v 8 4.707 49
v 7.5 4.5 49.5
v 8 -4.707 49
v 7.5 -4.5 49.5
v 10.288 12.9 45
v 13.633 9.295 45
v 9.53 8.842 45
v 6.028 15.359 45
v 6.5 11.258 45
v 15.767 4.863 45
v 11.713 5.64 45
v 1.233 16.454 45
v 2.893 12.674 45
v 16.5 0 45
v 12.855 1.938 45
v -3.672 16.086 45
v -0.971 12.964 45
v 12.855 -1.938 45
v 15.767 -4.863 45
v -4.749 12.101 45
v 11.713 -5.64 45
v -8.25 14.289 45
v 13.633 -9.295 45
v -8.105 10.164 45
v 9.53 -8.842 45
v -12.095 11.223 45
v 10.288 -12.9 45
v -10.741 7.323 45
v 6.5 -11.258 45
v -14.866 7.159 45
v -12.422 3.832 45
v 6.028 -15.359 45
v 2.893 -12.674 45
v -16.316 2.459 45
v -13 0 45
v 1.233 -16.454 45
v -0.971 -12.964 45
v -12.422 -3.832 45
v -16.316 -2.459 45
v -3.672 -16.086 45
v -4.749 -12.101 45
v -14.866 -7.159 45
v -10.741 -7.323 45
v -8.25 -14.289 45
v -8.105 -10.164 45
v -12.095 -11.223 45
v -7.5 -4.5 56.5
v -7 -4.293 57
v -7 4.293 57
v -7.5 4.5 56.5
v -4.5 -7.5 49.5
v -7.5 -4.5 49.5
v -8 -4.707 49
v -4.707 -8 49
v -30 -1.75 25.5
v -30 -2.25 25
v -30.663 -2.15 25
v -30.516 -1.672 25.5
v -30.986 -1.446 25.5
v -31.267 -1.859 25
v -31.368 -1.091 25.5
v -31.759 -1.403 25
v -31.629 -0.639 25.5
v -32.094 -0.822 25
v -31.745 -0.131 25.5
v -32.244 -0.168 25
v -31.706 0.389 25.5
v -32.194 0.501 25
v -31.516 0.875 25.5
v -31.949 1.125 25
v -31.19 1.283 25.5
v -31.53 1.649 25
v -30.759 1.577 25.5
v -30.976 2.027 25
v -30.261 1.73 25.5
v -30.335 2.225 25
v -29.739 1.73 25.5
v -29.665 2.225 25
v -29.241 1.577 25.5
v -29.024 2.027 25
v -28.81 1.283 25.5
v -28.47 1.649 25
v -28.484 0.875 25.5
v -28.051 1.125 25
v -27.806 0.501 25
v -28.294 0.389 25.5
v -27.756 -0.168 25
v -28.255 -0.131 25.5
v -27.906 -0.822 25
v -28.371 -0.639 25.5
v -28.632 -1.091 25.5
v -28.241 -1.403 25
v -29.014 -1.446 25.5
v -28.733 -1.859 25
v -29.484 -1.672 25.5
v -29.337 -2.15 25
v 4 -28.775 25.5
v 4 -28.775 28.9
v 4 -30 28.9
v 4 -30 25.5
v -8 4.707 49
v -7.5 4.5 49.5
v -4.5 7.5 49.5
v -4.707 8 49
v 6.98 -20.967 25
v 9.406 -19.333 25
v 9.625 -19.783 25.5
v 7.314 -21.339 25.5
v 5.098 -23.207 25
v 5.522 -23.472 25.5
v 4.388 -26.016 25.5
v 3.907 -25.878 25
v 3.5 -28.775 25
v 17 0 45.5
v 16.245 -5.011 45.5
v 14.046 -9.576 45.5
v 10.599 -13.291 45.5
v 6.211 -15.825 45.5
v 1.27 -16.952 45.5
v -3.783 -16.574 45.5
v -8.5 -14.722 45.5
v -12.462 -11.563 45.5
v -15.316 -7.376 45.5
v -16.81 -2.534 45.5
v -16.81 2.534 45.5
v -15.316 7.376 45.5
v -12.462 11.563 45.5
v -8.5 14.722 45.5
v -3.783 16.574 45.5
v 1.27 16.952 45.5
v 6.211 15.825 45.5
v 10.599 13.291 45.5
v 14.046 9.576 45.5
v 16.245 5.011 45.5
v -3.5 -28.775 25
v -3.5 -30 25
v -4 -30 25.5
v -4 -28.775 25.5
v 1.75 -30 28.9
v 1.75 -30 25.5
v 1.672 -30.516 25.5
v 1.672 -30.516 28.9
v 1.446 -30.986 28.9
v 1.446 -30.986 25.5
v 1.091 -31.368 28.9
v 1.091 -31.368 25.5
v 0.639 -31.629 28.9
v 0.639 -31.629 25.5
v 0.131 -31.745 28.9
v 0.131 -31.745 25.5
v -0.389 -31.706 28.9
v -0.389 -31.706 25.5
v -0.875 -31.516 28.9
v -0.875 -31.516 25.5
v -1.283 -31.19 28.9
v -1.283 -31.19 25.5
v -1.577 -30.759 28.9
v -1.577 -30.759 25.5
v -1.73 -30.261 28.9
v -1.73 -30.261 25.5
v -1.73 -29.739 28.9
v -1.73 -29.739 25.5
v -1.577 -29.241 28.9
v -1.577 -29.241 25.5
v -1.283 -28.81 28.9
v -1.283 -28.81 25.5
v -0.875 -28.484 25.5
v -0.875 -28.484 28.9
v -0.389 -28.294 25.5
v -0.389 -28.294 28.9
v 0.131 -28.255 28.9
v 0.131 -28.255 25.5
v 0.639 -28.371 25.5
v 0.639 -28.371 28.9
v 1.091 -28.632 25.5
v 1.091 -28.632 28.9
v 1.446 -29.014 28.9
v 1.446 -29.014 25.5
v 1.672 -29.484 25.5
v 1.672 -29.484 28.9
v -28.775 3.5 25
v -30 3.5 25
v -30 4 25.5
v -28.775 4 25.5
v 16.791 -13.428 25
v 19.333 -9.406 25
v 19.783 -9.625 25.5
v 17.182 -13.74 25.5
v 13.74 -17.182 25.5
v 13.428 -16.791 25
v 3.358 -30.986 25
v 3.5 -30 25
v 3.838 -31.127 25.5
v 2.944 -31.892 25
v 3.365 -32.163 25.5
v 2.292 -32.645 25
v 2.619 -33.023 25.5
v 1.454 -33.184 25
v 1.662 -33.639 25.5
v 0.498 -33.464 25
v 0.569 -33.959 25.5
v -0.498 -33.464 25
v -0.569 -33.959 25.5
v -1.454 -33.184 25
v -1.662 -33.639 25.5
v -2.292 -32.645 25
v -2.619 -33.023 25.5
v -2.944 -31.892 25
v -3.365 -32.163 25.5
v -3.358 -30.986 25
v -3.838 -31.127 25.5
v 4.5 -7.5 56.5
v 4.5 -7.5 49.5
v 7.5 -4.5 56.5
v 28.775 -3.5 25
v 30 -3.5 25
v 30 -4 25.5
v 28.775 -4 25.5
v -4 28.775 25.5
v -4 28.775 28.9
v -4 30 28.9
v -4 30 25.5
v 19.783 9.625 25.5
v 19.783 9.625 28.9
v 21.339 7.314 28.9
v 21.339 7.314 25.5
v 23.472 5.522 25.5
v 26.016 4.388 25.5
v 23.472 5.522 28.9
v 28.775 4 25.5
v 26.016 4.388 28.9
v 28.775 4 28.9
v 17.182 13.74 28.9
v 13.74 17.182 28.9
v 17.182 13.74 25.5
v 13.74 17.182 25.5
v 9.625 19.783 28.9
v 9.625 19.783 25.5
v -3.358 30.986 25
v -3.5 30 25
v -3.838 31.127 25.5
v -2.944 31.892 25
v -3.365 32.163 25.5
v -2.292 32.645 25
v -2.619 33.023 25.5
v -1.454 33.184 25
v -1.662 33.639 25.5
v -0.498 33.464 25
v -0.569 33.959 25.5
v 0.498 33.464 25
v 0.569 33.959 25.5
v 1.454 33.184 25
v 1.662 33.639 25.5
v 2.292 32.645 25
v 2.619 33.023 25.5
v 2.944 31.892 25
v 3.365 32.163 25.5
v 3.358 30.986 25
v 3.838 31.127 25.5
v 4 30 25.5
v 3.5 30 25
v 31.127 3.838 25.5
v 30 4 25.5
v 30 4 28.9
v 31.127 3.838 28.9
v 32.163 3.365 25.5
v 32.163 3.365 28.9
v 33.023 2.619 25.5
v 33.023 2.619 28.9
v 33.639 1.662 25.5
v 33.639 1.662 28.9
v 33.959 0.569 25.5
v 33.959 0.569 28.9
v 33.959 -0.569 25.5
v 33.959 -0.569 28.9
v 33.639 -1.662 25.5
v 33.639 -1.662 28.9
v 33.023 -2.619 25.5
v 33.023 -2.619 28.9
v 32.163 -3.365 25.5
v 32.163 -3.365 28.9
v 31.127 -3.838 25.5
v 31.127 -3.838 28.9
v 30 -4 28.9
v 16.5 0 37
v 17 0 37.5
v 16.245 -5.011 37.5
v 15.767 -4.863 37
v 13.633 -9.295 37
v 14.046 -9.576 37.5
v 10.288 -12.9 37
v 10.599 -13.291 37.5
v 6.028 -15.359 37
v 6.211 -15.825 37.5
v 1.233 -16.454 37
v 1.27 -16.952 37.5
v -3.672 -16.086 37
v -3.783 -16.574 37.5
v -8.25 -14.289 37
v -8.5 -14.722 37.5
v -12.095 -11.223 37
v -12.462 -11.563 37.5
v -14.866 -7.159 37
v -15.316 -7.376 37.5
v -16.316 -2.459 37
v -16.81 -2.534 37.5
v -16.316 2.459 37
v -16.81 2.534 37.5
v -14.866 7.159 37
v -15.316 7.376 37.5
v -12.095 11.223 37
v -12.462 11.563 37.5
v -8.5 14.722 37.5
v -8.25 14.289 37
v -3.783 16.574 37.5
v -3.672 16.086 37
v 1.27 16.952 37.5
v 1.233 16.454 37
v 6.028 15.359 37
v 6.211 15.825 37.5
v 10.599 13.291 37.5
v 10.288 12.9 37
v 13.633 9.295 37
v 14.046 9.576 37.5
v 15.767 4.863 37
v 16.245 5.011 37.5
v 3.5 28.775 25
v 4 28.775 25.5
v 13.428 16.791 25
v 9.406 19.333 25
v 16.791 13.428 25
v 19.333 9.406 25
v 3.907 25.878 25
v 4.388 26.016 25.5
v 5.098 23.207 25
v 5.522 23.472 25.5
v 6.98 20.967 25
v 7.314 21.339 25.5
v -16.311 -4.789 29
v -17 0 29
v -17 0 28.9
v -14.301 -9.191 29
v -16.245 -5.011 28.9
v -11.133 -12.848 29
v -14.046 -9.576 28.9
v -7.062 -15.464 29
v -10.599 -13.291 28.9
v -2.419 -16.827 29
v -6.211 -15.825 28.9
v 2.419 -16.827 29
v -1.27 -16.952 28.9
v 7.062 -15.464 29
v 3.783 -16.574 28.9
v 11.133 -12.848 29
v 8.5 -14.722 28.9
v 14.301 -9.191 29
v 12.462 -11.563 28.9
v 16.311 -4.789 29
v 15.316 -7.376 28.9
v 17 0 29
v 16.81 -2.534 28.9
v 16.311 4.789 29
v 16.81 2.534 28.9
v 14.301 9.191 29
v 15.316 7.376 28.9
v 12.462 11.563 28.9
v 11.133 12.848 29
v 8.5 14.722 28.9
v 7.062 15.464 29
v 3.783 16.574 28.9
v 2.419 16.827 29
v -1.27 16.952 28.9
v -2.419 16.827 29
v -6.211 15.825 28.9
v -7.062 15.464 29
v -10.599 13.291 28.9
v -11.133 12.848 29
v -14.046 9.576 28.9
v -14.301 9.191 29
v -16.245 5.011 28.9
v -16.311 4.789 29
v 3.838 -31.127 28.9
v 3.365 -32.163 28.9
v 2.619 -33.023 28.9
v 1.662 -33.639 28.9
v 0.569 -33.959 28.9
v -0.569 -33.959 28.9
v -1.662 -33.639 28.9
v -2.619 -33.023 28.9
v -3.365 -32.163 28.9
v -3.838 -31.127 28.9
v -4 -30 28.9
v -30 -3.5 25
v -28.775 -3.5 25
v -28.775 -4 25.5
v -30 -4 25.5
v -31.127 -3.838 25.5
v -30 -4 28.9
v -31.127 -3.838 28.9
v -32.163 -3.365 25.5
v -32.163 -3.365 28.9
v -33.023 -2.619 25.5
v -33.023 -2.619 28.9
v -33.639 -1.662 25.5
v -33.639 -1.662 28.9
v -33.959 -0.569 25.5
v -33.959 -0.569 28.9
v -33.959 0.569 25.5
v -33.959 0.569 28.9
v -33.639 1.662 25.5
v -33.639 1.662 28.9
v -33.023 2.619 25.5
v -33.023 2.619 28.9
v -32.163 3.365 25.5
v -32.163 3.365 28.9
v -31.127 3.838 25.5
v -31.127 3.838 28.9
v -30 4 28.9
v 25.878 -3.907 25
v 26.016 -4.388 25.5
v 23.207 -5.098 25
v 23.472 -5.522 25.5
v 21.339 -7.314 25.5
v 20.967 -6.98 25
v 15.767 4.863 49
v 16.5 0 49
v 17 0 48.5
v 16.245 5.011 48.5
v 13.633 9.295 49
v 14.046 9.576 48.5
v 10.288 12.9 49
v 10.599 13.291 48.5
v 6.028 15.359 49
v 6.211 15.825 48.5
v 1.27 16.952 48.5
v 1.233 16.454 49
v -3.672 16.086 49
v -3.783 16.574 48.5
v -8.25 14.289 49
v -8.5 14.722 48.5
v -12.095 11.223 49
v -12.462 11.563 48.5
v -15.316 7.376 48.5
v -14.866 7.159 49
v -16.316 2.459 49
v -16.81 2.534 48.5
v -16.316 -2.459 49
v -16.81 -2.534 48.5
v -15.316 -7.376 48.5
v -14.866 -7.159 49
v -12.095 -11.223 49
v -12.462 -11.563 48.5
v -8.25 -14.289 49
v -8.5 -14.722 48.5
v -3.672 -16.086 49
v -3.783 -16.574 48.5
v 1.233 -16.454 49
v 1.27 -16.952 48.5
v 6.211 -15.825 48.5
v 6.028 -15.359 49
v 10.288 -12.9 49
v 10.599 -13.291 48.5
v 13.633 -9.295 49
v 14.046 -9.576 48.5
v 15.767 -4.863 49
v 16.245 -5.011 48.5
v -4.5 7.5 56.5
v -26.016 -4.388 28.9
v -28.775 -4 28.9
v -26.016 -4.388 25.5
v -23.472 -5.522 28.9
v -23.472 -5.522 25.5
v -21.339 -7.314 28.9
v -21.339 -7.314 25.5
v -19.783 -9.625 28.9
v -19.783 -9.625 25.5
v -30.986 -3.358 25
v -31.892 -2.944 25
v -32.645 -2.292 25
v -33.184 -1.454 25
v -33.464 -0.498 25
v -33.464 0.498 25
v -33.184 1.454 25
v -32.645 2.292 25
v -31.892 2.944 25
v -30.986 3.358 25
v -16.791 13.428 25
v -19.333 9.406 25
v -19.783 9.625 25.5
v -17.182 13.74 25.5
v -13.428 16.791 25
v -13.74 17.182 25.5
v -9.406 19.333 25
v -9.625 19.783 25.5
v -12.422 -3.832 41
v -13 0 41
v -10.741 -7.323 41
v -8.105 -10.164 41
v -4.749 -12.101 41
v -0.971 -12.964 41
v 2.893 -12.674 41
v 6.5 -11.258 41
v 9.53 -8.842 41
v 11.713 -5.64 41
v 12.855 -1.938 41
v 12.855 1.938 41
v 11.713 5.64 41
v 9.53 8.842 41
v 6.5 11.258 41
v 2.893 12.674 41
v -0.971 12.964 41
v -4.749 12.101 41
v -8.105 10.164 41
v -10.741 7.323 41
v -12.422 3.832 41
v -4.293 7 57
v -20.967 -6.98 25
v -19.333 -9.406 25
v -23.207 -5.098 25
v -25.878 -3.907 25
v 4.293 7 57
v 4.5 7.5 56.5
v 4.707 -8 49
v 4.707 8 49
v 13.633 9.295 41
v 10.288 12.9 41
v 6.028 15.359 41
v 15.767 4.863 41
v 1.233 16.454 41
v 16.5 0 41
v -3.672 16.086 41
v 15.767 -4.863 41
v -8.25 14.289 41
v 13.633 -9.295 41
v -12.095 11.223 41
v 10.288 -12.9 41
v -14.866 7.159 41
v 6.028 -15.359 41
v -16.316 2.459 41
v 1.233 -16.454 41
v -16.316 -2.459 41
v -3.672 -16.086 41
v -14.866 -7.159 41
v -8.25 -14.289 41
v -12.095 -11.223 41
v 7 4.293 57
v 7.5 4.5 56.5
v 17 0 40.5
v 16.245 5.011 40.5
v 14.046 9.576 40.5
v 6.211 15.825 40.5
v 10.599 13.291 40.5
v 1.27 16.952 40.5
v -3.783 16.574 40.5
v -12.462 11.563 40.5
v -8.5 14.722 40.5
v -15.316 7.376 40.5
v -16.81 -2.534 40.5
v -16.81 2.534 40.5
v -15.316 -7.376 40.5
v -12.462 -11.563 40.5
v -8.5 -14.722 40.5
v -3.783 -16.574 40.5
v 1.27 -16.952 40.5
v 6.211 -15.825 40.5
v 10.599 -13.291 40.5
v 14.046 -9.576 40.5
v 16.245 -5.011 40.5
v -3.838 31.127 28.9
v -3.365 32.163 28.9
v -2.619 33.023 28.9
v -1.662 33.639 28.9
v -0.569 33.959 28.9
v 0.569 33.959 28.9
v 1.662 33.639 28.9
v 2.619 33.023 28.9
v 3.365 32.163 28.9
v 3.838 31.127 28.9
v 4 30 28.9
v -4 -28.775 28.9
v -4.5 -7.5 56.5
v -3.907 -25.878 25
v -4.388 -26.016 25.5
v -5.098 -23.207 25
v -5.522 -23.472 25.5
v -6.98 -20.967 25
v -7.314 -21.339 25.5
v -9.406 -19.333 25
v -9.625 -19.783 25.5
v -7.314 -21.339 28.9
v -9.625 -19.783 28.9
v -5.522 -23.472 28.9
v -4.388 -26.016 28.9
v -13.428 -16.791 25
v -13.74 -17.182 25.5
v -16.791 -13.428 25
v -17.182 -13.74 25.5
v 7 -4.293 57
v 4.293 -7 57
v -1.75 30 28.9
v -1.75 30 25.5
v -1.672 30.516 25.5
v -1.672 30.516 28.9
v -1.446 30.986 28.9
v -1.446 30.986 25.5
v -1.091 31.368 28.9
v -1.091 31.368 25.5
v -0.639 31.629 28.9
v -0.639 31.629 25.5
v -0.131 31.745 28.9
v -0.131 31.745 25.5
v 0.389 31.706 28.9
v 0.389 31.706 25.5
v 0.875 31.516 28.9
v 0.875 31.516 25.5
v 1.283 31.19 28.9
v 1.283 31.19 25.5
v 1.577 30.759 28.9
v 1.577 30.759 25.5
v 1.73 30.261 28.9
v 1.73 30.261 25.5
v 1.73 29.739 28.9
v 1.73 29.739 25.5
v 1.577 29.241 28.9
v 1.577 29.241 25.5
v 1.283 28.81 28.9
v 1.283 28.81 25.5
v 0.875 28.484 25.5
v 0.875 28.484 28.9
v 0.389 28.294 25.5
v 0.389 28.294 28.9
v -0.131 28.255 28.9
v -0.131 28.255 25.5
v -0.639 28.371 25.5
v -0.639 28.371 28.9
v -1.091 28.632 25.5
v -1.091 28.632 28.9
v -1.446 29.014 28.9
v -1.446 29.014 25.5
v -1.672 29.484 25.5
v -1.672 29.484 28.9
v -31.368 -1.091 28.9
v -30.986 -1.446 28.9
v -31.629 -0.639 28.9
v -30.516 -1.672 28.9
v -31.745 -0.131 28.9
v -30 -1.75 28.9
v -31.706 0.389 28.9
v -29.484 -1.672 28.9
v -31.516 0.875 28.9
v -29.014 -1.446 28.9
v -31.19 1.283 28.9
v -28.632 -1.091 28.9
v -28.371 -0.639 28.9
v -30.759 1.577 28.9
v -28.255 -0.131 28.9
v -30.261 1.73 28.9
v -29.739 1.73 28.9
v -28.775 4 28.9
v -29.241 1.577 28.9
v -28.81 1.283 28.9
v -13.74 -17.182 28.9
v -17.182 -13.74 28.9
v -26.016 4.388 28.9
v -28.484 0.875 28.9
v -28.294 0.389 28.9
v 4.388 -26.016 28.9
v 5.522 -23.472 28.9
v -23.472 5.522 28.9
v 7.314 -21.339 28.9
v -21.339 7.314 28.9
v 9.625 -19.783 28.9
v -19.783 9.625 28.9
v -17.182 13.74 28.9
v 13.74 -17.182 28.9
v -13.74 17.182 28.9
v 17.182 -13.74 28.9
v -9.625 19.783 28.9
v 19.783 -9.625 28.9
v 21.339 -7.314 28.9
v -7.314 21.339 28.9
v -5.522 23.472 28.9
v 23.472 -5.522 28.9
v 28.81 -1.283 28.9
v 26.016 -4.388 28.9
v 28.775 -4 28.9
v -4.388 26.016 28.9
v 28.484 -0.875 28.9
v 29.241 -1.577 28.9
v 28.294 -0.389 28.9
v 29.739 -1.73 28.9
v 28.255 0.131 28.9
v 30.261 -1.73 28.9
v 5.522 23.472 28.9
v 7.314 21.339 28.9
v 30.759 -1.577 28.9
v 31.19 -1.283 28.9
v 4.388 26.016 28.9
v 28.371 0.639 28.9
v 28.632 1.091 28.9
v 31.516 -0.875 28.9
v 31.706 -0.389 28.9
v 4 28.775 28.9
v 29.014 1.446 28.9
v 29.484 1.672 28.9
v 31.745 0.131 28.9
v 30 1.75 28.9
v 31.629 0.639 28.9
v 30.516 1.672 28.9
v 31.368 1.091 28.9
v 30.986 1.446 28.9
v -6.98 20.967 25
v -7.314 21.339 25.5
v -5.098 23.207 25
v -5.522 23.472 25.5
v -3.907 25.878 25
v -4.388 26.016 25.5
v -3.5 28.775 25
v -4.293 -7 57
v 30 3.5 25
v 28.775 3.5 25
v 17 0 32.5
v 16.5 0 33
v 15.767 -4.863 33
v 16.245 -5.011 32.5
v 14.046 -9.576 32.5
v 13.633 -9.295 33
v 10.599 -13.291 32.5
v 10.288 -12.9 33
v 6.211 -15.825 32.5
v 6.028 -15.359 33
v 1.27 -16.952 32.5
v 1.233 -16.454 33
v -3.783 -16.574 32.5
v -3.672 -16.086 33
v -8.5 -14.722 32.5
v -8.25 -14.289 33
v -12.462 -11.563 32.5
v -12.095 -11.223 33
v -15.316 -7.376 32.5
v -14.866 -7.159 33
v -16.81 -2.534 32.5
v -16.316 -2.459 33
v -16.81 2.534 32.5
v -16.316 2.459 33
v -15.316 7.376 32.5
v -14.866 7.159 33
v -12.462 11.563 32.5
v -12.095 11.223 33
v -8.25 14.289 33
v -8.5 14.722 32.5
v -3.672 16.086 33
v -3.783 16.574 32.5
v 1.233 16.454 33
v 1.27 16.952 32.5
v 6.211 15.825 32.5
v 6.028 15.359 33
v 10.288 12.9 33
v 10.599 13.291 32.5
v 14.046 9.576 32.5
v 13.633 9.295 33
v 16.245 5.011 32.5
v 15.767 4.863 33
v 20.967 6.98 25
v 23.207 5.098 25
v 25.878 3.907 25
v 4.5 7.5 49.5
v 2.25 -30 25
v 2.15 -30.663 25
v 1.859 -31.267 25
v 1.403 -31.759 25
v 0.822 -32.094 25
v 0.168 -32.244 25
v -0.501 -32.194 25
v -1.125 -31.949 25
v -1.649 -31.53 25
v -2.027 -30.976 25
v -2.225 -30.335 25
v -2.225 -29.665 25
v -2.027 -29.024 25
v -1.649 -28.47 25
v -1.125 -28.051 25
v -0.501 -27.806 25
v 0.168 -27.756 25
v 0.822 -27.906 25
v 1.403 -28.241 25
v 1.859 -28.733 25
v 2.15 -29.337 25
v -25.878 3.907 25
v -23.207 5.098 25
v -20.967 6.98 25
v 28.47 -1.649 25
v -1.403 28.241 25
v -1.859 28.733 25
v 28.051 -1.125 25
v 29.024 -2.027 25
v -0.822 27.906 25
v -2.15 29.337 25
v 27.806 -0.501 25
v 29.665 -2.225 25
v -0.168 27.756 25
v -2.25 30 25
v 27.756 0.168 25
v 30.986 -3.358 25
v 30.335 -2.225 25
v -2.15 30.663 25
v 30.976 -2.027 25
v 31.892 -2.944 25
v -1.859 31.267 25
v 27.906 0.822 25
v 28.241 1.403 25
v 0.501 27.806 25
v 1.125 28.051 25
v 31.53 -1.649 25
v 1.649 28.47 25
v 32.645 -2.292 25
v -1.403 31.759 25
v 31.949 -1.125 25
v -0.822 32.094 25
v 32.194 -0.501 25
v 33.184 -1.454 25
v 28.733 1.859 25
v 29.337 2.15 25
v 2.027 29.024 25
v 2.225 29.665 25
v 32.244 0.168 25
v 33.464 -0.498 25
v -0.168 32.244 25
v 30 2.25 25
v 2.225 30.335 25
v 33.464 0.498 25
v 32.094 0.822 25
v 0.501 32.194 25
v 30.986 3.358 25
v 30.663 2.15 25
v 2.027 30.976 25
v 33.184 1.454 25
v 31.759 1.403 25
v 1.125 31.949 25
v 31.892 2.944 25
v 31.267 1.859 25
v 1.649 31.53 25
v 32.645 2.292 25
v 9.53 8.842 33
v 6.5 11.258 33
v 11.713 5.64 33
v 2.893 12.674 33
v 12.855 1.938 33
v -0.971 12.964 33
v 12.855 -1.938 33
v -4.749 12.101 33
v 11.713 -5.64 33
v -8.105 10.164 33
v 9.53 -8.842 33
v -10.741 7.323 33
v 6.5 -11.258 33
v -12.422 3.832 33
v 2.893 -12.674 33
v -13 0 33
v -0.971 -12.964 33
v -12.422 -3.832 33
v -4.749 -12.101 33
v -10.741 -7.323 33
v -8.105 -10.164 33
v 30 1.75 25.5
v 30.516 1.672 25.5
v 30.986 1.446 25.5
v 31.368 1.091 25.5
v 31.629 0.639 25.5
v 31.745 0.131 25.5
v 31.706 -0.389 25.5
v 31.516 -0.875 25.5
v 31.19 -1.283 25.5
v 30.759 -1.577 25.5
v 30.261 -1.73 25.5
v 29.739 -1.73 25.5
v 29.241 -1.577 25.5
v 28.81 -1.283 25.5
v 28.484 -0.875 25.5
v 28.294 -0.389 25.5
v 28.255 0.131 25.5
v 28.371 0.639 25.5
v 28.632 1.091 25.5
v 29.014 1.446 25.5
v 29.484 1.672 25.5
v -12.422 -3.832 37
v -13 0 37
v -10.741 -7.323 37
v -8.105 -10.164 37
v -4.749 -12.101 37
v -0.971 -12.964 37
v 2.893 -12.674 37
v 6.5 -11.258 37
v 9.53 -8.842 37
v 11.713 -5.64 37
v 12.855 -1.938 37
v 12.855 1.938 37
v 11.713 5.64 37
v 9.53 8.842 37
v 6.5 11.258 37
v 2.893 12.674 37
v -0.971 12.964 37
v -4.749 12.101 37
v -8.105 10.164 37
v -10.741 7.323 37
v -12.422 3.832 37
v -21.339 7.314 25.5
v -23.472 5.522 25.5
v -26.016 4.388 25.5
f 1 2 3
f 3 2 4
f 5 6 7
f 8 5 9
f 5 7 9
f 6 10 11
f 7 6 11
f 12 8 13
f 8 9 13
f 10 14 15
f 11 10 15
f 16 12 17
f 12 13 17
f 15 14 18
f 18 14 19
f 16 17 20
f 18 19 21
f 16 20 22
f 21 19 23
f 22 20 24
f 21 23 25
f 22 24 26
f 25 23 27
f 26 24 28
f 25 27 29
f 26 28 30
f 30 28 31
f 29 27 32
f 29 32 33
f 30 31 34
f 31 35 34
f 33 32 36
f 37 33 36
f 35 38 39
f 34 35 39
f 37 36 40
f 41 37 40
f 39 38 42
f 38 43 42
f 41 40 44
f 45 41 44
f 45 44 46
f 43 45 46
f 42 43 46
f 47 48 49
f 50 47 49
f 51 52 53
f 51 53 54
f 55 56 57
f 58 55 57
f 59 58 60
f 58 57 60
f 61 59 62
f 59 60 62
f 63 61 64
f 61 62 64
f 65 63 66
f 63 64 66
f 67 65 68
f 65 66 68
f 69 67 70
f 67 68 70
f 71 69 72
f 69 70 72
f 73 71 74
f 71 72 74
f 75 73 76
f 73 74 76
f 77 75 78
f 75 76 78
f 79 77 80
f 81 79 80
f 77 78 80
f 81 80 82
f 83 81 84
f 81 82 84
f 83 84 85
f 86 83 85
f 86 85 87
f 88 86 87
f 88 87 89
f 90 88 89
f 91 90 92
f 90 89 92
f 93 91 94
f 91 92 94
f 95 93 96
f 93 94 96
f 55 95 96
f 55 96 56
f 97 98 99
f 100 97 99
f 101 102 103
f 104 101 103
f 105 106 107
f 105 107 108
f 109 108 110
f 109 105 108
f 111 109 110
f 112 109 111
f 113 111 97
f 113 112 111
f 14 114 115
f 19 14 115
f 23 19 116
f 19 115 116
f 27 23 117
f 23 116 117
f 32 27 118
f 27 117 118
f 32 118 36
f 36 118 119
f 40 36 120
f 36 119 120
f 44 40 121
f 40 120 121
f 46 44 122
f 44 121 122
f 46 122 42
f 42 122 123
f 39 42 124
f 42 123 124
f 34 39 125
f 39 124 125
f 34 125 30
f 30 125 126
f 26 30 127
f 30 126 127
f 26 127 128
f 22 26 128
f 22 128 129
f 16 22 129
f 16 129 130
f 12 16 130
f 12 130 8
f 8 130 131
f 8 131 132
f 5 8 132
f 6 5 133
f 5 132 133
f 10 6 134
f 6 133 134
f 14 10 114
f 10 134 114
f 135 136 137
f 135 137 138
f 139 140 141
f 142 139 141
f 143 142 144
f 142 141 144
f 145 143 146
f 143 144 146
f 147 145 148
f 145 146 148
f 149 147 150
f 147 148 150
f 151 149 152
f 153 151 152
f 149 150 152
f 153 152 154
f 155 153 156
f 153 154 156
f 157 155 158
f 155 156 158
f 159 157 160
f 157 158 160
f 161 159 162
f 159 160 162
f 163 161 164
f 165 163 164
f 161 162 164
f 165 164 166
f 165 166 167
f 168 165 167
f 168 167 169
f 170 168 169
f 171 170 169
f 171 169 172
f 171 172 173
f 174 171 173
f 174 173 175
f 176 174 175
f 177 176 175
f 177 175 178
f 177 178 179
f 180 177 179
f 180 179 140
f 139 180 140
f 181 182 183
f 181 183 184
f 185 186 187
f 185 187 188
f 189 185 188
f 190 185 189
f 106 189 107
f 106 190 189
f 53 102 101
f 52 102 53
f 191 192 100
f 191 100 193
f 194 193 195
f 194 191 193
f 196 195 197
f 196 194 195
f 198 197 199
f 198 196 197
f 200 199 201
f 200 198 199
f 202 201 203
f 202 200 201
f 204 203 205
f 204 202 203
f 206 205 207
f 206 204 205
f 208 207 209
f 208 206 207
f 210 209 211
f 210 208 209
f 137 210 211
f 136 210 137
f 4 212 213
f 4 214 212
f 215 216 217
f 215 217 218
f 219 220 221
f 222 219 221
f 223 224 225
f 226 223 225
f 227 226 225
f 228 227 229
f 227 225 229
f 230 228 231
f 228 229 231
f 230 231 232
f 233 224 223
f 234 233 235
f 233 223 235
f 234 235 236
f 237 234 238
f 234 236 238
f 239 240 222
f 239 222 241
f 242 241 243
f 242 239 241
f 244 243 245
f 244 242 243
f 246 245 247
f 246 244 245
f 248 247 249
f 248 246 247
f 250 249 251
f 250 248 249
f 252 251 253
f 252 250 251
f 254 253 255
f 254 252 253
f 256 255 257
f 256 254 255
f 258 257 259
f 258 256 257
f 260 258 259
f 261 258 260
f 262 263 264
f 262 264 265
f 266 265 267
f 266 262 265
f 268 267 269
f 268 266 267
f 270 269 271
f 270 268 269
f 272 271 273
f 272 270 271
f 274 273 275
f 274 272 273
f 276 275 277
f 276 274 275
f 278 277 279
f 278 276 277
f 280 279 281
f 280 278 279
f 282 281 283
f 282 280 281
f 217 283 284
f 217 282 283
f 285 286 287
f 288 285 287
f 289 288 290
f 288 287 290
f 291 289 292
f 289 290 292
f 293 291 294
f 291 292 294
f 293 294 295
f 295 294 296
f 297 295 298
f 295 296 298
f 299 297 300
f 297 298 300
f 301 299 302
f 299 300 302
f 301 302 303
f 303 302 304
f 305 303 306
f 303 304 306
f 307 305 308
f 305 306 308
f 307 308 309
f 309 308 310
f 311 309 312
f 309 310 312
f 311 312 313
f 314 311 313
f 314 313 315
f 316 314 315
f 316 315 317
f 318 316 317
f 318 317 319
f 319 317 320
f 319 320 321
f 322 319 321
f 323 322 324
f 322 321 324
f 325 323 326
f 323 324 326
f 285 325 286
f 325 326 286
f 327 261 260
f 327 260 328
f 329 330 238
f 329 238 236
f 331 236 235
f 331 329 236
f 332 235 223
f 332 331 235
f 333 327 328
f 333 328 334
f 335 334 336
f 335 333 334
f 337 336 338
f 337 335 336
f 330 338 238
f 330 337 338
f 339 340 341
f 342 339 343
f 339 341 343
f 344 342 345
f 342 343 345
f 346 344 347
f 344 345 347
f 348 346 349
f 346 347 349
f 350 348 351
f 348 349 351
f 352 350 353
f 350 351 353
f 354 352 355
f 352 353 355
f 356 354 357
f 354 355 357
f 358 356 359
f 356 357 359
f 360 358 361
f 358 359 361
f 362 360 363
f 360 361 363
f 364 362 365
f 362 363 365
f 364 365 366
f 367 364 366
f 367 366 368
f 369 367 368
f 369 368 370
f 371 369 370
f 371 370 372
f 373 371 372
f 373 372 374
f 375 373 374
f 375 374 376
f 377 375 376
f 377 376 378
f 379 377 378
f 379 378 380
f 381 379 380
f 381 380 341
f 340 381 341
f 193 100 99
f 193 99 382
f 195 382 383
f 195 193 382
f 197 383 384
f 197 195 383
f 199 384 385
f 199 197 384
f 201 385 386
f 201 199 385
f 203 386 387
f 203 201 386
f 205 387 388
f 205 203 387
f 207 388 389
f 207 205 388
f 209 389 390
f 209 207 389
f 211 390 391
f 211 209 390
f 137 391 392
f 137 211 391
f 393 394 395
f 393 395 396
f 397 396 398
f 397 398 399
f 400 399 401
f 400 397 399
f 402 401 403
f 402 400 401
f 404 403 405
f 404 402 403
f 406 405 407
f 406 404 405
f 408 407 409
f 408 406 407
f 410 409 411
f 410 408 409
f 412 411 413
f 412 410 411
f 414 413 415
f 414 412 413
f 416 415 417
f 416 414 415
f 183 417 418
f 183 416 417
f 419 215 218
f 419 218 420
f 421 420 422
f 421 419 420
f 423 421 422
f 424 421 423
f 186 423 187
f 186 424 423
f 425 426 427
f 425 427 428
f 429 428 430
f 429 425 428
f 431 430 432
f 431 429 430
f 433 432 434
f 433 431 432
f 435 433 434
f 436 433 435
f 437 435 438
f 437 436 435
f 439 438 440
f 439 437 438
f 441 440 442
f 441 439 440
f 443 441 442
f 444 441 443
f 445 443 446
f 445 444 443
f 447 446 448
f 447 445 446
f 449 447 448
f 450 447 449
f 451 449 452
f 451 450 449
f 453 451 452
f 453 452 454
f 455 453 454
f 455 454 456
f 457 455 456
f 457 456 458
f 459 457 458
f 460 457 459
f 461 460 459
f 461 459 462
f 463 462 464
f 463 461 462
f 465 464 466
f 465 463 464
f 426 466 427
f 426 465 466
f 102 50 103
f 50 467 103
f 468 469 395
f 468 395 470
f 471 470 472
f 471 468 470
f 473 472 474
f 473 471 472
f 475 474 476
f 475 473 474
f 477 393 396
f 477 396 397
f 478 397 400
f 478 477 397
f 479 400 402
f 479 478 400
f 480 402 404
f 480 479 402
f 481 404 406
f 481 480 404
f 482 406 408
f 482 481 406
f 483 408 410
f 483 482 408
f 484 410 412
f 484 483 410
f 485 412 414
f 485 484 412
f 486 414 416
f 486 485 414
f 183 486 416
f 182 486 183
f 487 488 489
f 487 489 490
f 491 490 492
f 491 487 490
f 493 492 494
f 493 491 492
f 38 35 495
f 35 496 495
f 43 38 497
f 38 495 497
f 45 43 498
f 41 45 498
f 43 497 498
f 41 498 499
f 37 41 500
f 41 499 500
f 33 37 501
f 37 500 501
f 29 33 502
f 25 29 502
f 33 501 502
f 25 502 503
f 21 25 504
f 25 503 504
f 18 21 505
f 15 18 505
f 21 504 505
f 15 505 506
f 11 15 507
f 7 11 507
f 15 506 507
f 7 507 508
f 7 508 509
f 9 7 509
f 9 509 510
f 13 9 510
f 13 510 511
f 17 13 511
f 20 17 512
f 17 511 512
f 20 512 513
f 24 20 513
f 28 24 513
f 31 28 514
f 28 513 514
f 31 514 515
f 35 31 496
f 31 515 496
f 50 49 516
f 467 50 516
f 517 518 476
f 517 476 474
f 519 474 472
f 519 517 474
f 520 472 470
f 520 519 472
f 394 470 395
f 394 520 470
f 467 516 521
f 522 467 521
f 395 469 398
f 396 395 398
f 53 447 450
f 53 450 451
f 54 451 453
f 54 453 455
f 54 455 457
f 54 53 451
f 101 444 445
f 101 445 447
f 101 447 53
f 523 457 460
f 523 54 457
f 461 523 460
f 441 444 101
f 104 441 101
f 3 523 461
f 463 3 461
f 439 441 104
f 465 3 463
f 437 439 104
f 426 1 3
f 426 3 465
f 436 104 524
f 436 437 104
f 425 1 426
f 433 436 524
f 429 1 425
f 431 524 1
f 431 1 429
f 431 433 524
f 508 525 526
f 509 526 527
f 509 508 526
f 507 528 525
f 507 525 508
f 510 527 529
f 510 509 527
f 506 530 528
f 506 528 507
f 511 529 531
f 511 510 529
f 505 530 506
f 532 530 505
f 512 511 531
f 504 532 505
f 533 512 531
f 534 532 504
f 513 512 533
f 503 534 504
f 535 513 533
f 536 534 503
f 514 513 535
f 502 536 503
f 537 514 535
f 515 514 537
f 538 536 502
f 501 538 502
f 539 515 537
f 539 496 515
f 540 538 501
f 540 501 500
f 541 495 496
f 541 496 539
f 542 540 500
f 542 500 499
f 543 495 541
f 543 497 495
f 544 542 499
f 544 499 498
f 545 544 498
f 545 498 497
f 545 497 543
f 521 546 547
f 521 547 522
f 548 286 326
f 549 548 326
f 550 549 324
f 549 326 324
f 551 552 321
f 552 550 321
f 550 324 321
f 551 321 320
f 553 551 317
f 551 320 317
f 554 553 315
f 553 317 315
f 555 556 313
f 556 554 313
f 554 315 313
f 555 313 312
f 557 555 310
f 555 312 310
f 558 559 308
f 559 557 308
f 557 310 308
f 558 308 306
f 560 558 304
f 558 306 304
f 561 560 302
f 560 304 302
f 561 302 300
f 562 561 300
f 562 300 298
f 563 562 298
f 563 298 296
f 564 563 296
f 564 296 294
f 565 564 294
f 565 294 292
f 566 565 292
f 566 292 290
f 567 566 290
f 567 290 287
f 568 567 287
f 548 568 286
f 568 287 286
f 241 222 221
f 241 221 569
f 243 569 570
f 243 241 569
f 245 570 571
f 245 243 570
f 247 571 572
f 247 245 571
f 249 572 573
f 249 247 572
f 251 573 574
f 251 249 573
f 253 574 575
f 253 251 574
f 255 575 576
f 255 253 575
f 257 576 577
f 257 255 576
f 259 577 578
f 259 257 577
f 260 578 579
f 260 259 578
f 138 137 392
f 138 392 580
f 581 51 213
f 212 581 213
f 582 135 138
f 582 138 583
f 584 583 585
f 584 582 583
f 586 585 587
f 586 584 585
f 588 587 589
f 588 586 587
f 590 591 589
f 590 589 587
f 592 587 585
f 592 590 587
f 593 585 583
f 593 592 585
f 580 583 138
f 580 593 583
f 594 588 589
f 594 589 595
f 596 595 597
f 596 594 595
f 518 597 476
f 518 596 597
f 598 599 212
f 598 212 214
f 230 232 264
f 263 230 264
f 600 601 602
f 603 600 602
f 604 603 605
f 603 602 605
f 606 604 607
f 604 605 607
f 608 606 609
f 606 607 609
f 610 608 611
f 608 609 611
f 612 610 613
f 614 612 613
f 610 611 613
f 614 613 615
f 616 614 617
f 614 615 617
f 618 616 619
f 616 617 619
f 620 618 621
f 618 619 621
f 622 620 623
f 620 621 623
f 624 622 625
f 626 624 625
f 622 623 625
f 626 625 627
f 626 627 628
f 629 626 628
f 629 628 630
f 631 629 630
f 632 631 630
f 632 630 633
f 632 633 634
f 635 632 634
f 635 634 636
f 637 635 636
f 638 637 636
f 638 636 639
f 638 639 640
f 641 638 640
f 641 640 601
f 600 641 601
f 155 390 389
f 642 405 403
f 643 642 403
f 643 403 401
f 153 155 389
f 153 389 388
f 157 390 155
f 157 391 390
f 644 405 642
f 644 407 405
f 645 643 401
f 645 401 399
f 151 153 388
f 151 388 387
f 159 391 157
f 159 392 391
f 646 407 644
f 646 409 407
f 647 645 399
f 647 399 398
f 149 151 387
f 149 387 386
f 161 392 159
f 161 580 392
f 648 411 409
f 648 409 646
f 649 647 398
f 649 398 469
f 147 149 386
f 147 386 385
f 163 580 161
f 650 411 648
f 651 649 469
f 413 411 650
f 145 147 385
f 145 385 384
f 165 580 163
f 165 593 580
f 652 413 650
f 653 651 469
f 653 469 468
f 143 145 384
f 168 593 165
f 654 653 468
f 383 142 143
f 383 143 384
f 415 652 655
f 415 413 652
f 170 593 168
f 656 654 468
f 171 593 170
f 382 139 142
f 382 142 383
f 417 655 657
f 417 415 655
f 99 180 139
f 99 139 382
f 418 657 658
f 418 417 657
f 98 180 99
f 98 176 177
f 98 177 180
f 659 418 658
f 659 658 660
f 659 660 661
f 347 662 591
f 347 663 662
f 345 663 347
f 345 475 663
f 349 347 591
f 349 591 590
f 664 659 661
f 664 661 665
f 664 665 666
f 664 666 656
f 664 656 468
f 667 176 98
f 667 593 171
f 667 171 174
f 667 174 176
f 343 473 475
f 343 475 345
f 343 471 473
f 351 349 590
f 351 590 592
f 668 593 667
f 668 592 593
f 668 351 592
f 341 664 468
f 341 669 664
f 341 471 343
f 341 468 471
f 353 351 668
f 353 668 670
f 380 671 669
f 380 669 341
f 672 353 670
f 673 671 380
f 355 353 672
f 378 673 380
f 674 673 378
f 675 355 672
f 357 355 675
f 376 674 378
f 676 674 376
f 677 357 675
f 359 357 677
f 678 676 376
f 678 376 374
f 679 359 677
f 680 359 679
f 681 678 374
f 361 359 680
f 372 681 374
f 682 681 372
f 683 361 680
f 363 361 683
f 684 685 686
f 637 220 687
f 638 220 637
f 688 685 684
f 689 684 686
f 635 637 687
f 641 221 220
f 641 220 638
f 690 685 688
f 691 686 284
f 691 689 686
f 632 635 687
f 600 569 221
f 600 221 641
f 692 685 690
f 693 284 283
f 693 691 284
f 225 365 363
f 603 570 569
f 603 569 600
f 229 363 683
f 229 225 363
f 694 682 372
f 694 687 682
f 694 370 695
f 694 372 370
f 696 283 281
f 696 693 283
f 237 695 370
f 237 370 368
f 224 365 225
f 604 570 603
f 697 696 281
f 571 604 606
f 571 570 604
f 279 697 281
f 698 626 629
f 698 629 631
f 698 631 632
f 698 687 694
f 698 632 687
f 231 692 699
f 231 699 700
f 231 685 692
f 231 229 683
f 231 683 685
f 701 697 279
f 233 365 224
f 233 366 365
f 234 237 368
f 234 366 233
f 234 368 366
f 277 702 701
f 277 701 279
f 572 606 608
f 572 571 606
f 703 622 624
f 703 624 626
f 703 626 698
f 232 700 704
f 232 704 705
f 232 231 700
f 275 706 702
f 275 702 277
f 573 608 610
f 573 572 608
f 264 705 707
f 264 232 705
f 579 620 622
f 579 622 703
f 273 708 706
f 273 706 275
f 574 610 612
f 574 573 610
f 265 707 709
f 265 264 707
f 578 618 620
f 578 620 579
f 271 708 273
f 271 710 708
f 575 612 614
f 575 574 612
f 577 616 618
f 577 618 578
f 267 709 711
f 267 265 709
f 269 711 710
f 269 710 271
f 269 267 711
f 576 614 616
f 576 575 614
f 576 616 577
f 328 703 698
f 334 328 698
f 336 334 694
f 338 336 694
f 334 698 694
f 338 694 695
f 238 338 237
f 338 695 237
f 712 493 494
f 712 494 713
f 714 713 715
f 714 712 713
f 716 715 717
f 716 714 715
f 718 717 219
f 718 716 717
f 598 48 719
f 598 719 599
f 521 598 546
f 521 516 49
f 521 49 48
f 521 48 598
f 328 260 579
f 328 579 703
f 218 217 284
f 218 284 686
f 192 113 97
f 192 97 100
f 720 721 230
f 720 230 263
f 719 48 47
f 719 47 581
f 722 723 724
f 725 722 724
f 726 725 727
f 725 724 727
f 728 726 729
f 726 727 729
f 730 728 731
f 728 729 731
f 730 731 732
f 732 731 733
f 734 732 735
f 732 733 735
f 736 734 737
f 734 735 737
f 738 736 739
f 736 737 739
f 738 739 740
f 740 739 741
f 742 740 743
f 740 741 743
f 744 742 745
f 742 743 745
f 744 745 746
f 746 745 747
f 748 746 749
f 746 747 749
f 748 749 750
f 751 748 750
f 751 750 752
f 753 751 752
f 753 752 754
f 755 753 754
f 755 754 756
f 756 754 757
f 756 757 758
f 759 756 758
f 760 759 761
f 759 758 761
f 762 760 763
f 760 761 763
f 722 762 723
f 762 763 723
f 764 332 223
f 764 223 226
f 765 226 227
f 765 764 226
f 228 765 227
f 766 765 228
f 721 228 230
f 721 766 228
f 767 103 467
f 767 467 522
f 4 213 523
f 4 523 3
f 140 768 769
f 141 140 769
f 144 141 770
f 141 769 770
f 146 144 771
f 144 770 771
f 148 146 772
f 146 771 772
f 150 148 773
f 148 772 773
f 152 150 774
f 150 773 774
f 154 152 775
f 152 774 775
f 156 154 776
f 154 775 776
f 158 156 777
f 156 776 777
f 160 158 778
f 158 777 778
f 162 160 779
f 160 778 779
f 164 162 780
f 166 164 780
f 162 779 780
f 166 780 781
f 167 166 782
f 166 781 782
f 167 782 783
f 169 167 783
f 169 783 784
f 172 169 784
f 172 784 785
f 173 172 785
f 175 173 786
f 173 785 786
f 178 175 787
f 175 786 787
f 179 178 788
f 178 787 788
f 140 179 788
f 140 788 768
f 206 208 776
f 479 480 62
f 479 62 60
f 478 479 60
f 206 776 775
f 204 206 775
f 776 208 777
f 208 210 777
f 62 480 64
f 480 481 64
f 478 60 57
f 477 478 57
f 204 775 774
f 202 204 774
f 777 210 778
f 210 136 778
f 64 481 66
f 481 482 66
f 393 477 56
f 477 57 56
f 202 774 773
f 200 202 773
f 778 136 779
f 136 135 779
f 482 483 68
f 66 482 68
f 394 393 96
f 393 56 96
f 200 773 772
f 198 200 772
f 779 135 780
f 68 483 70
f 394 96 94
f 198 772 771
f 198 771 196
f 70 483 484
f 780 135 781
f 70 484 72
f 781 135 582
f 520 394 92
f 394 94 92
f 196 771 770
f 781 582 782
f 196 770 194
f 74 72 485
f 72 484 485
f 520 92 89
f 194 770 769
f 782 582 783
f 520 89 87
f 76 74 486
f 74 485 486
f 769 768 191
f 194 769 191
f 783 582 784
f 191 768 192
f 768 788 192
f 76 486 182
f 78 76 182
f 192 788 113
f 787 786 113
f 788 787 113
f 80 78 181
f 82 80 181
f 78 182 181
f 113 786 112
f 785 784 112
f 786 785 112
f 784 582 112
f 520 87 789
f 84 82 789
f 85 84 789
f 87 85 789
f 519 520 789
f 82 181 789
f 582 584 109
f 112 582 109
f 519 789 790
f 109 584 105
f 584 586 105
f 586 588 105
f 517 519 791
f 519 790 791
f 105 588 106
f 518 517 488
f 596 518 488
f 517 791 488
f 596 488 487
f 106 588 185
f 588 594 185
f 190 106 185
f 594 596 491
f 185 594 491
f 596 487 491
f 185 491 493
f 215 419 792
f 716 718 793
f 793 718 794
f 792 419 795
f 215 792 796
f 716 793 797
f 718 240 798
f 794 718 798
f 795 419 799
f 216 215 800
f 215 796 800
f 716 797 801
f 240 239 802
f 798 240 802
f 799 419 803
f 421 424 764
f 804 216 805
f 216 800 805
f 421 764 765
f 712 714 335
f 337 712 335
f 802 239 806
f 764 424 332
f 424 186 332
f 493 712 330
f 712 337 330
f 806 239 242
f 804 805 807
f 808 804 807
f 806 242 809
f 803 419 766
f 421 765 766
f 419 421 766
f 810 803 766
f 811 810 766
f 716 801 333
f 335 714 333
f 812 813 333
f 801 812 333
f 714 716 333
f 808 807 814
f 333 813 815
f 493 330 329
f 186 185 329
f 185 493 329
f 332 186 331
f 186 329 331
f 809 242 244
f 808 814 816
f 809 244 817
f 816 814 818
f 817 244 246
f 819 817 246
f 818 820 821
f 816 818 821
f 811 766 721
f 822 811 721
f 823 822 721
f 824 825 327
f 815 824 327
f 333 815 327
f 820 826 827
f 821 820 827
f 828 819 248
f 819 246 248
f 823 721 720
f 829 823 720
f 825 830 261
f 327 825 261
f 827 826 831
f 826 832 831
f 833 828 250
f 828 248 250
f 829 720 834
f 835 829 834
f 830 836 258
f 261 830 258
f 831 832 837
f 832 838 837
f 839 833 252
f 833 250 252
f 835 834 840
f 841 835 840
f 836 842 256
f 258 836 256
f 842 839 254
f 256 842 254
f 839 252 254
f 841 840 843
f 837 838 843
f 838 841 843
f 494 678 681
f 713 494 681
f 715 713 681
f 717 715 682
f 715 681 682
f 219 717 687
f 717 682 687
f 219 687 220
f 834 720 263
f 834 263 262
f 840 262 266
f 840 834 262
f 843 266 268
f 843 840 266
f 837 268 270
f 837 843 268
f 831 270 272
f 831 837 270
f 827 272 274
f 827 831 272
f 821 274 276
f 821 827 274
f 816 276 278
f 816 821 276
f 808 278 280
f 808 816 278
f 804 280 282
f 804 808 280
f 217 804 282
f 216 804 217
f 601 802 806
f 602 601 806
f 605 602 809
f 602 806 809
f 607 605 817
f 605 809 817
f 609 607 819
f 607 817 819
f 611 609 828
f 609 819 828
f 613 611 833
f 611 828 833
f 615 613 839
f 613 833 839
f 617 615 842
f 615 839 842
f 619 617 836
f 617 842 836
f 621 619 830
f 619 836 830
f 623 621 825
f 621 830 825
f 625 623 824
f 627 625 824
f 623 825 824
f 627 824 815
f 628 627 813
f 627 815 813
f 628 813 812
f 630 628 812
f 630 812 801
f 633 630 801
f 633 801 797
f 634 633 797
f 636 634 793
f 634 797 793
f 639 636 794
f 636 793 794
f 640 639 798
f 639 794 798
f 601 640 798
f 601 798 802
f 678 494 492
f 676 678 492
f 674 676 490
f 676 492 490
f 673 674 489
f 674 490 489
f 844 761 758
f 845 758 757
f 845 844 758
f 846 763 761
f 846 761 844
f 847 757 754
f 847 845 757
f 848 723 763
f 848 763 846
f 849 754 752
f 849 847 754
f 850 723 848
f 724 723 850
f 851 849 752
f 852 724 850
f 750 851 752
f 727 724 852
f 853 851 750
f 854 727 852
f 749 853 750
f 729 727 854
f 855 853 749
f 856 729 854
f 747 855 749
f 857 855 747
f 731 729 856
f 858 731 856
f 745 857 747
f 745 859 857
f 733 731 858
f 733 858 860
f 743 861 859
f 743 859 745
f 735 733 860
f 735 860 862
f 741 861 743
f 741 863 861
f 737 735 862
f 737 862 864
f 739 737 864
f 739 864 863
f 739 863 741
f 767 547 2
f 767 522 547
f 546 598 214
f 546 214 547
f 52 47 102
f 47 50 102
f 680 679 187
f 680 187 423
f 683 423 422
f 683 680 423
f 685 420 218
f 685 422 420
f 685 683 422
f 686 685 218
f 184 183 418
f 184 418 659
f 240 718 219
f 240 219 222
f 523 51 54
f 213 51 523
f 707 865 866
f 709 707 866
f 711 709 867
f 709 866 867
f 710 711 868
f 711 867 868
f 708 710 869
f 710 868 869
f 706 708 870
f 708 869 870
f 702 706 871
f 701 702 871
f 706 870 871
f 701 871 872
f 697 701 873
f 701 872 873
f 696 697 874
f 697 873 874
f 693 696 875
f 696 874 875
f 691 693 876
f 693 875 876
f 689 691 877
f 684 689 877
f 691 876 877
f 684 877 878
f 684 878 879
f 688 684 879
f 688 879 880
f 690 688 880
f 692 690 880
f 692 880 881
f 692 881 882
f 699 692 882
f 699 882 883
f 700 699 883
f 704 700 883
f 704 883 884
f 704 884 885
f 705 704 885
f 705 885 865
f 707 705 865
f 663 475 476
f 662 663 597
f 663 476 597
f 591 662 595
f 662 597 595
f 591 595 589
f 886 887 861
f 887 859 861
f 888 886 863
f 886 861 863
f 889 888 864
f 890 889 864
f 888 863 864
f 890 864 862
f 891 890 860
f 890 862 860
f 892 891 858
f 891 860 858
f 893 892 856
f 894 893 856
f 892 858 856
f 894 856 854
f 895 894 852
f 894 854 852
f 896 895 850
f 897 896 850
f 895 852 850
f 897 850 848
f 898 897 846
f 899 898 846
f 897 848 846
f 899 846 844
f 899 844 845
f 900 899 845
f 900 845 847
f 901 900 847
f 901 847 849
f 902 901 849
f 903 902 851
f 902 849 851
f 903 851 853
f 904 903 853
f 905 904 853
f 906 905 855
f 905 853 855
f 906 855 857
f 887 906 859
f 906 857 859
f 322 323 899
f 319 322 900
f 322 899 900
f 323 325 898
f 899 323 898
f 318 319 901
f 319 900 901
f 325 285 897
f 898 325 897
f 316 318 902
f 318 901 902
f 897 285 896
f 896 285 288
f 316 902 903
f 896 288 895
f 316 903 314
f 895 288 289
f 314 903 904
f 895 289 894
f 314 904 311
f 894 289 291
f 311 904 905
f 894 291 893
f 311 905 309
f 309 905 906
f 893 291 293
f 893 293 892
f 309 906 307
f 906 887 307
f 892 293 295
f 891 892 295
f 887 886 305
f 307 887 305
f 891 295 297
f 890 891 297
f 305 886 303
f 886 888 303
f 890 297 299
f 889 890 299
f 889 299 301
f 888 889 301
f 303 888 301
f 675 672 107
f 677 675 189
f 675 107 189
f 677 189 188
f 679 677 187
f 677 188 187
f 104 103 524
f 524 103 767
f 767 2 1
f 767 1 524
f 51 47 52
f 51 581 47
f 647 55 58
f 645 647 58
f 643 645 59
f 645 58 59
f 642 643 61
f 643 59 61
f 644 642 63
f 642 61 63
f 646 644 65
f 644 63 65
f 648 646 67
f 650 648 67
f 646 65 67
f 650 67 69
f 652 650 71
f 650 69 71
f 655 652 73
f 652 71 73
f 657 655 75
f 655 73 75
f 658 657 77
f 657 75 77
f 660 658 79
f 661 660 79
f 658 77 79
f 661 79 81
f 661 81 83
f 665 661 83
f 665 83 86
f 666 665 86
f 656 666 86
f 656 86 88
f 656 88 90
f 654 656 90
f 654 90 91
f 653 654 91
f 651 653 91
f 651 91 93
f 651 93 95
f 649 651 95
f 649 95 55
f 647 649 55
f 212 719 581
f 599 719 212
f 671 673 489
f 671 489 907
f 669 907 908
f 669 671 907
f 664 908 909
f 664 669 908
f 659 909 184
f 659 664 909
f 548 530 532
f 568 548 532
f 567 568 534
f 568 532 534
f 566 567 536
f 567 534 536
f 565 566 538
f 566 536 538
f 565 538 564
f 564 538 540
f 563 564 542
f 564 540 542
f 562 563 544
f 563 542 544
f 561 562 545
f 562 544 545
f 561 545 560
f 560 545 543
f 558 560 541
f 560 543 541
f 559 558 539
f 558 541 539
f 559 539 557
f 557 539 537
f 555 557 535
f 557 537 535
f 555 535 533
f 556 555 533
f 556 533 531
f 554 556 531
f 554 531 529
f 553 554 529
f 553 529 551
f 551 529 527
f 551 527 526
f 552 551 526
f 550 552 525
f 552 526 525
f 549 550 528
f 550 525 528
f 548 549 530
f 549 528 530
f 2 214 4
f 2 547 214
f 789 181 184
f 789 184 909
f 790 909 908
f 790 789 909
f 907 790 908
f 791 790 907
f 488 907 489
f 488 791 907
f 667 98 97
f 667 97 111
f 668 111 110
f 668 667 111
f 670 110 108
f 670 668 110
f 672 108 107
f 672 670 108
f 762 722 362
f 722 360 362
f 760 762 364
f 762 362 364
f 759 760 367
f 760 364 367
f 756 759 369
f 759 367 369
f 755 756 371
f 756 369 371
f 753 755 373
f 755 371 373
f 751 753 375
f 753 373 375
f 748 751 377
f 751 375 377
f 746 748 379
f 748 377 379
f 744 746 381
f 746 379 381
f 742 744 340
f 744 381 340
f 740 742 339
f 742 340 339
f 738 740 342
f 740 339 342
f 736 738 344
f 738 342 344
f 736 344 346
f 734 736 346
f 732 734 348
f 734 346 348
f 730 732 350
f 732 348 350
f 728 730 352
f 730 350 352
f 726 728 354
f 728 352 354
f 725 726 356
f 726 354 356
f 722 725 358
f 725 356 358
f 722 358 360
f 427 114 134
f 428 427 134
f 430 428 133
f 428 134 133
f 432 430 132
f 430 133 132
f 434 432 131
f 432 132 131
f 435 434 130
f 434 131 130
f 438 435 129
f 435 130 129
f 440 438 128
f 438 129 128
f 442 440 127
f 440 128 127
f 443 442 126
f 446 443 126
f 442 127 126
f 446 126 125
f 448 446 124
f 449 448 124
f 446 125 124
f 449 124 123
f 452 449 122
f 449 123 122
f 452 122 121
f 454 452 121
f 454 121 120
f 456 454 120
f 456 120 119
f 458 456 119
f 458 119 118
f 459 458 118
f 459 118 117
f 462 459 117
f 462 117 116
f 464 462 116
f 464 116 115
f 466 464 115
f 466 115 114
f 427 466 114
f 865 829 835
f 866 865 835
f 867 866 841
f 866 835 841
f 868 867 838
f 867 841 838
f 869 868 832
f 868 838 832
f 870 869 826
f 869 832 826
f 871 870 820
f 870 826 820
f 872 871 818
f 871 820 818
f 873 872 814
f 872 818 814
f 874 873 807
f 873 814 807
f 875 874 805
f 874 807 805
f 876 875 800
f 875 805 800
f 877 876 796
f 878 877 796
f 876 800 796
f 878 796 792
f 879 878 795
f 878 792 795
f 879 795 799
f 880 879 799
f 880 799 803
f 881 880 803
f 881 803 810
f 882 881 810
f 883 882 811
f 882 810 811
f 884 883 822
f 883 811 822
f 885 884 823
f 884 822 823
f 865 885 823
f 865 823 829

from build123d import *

# Parameters (mm, degrees)
SKETCH2_R           = 15
SKETCH1_R           = 25
SKETCH3_R           = 15
BOSS_EXTRUDE1_DEPTH = 5
FILLET1_R           = 10
SKETCH4_R           = 1.75
CUT_EXTRUDE1_DEPTH  = 130
SKETCH5_R           = 4
CUT_EXTRUDE2_DEPTH  = 130
SKETCH6_R           = 22
BOSS_EXTRUDE2_DEPTH = 4
SKETCH7_R           = 17
BOSS_EXTRUDE3_DEPTH = 20
SKETCH15_W          = 8.431609766
SKETCH15_H          = 4
SKETCH15_W_2        = 8.578672696
SKETCH18_R          = 12.5
CUT_EXTRUDE5_DEPTH  = 20
SKETCH19_R          = 47.987160243
CUT_EXTRUDE6_DEPTH  = 44.301270362
SKETCH20_R          = 1.75
BOSS_EXTRUDE5_DEPTH = 4
CIRPATTERN3_COUNT   = 4
FILLET2_R           = 10
CHAMFER1_SIZE       = 0.5
SKETCH22_W          = 15
SKETCH22_H          = 8
BOSS_EXTRUDE6_DEPTH = 7.5
CHAMFER2_SIZE       = 3
CHAMFER3_SIZE       = 0.5
CUT_EXTRUDE8_START  = -0.1
SKETCH24_R          = 41.017326151
SKETCH24_R_2        = 17
CUT_EXTRUDE8_DEPTH  = 0.1
CHAMFER4_SIZE       = 0.5


with BuildPart() as part:
    # Sketch2 → Loft1 section 0
    with BuildSketch(Plane.XY.offset(20)):
        Circle(SKETCH2_R)
    # Sketch1 → Loft1 section 1
    with BuildSketch(Plane.XY):
        Circle(SKETCH1_R)
    loft()

    # Sketch3 → Boss-Extrude1 (add)
    with BuildSketch(Plane.XY.offset(20)):
        Circle(SKETCH3_R)
    extrude(amount=BOSS_EXTRUDE1_DEPTH)

    # Fillet1
    fillet1_edges = [part.edges().sort_by_distance(p)[0] for p in [
        (-15, 0, 20),
    ]]
    fillet(fillet1_edges, radius=FILLET1_R)

    # Sketch4 → Cut-Extrude1 (cut)
    with BuildSketch(Plane(origin=(0, 0, 0), x_dir=(-1, 0, 0), z_dir=(0, 0, -1))):
        with Locations((0, 20)):
            Circle(SKETCH4_R)
        with Locations((-20, 0)):
            Circle(SKETCH4_R)
        with Locations((0, -20)):
            Circle(SKETCH4_R)
        with Locations((20, 0)):
            Circle(SKETCH4_R)
    extrude(amount=-CUT_EXTRUDE1_DEPTH, mode=Mode.SUBTRACT)

    # Sketch5 → Cut-Extrude2 (cut)
    with BuildSketch(Plane(origin=(0, 0, 3), x_dir=(-1, 0, 0), z_dir=(0, 0, -1))):
        with Locations((0, 20)):
            Circle(SKETCH5_R)
        with Locations((20, 0)):
            Circle(SKETCH5_R)
        with Locations((-20, 0)):
            Circle(SKETCH5_R)
        with Locations((0, -20)):
            Circle(SKETCH5_R)
    extrude(amount=-CUT_EXTRUDE2_DEPTH, mode=Mode.SUBTRACT)

    # Sketch6 → Boss-Extrude2 (add)
    with BuildSketch(Plane.XY.offset(25)):
        Circle(SKETCH6_R)
    extrude(amount=BOSS_EXTRUDE2_DEPTH)

    # Sketch7 → Boss-Extrude3 (add)
    with BuildSketch(Plane.XY.offset(29)):
        Circle(SKETCH7_R)
    extrude(amount=BOSS_EXTRUDE3_DEPTH)

    # Sketch15 → Cut-Revolve1 (revolve, cut)
    with BuildSketch(Plane(origin=(0, 0, 0), x_dir=(1, 0, 0), z_dir=(0, 1, 0))):
        with Locations((-17.215804883, -35)):
            Rectangle(SKETCH15_W, SKETCH15_H)
        with Locations((-17.289336348, -43)):
            Rectangle(SKETCH15_W_2, SKETCH15_H)
    revolve(axis=Axis((0, 0, 29), (0, 0, 1)), mode=Mode.SUBTRACT)

    # Sketch18 → Cut-Extrude5 (cut)
    with BuildSketch(Plane(origin=(0, 0, 0), x_dir=(-1, 0, 0), z_dir=(0, 0, -1))):
        Circle(SKETCH18_R)
    extrude(amount=-CUT_EXTRUDE5_DEPTH, mode=Mode.SUBTRACT)

    # Sketch19 → Cut-Extrude6 (cut, through all)
    with BuildSketch(Plane(origin=(0, 0, 25), x_dir=(-1, 0, 0), z_dir=(0, 0, -1))):
        Circle(SKETCH19_R)
    extrude(amount=CUT_EXTRUDE6_DEPTH, mode=Mode.SUBTRACT)

    # Sketch20 → Boss-Extrude5 (add)
    with BuildSketch(Plane(origin=(0, 0, 25), x_dir=(-1, 0, 0), z_dir=(0, 0, -1))):
        with BuildLine():
            Line((-4, 30), (-4, 21.633307653))
            ThreePointArc((-4, 21.633307653), (0, 22), (4, 21.633307653))
            Line((4, 21.633307653), (4, 30))
            ThreePointArc((4, 30), (0, 34), (-4, 30))
        make_face()
        with Locations((0, 30)):
            Circle(SKETCH20_R, mode=Mode.SUBTRACT)
    boss_extrude5 = extrude(amount=-BOSS_EXTRUDE5_DEPTH)

    # CirPattern3: Boss-Extrude5 ×4 about axis
    cirpattern3_axis = Axis((0, 0, 0), (0, 0, 1))
    for i in range(1, CIRPATTERN3_COUNT):
        add(boss_extrude5.rotate(cirpattern3_axis, i * 360 / CIRPATTERN3_COUNT))

    # Fillet2
    fillet2_edges = [part.edges().sort_by_distance(p)[0] for p in [
        (-4, 21.633307653, 27),
        (4, 21.633307653, 27),
        (-21.633307653, -4, 27),
        (-21.633307653, 4, 27),
        (4, -21.633307653, 27),
        (-4, -21.633307653, 27),
        (21.633307653, 4, 27),
        (21.633307653, -4, 27),
    ]]
    fillet(fillet2_edges, radius=FILLET2_R)

    # Chamfer1
    chamfer1_edges = [part.edges().sort_by_distance(p)[0] for p in [
        (-17, 0, 49),
        (-17, 0, 37),
        (-17, 0, 33),
        (-17, 0, 45),
        (-17, 0, 41),
    ]]
    chamfer(chamfer1_edges, length=CHAMFER1_SIZE)

    # Sketch22 → Boss-Extrude6 (add, symmetric)
    with BuildSketch(Plane(origin=(0, 0, 0), x_dir=(1, 0, 0), z_dir=(0, 1, 0))):
        with Locations((0, -53)):
            Rectangle(SKETCH22_W, SKETCH22_H)
    extrude(amount=BOSS_EXTRUDE6_DEPTH, both=True)

    # Chamfer2
    chamfer2_edges = [part.edges().sort_by_distance(p)[0] for p in [
        (7.5, -7.5, 53),
        (-7.5, -7.5, 53),
        (7.5, 7.5, 53),
        (-7.5, 7.5, 53),
    ]]
    chamfer(chamfer2_edges, length=CHAMFER2_SIZE)

    # Chamfer3
    chamfer3_edges = [part.edges().sort_by_distance(p)[0] for p in [
        (7.5, 0, 49),
        (7.5, 0, 57),
        (0, -7.5, 57),
        (0, -7.5, 49),
        (0, 7.5, 57),
        (-7.5, 0, 57),
        (-6, 6, 57),
        (-6, -6, 57),
        (6, 6, 57),
        (6, -6, 57),
        (0, 7.5, 49),
        (-7.5, 0, 49),
        (6, -6, 49),
        (6, 6, 49),
        (-6, -6, 49),
        (-6, 6, 49),
    ]]
    chamfer(chamfer3_edges, length=CHAMFER3_SIZE)

    # Sketch24 → Cut-Extrude8 (cut)
    with BuildSketch(Plane.XY.offset(29).offset(CUT_EXTRUDE8_START)):
        Circle(SKETCH24_R)
        with Locations(Location((0, 0, 0), (0, 0, 180))):
            Circle(SKETCH24_R_2, mode=Mode.SUBTRACT)
    extrude(amount=CUT_EXTRUDE8_DEPTH, mode=Mode.SUBTRACT)

    # Chamfer4
    chamfer4_edges = [part.edges().sort_by_distance(p)[0] for p in [
        (0, 34, 25),
        (4, 29.38749457, 25),
        (1.75, 30, 25),
        (-34, 0, 25),
        (-29.38749457, 4, 25),
        (-30, 1.75, 25),
        (0, -34, 25),
        (-4, -29.38749457, 25),
        (-1.75, -30, 25),
        (34, 0, 25),
        (29.38749457, -4, 25),
        (30, -1.75, 25),
        (15.556349186, 15.556349186, 25),
        (29.38749457, 4, 25),
        (15.556349186, -15.556349186, 25),
        (4, -29.38749457, 25),
        (-15.556349186, -15.556349186, 25),
        (-29.38749457, -4, 25),
        (-15.556349186, 15.556349186, 25),
        (-4, 29.38749457, 25),
        (23.471688281, 5.522087521, 25),
        (23.471688281, -5.522087521, 25),
        (5.522087521, -23.471688281, 25),
        (-5.522087521, -23.471688281, 25),
        (-23.471688281, -5.522087521, 25),
        (-23.471688281, 5.522087521, 25),
        (-5.522087521, 23.471688281, 25),
        (5.522087521, 23.471688281, 25),
    ]]
    chamfer(chamfer4_edges, length=CHAMFER4_SIZE)


solid = part.part
